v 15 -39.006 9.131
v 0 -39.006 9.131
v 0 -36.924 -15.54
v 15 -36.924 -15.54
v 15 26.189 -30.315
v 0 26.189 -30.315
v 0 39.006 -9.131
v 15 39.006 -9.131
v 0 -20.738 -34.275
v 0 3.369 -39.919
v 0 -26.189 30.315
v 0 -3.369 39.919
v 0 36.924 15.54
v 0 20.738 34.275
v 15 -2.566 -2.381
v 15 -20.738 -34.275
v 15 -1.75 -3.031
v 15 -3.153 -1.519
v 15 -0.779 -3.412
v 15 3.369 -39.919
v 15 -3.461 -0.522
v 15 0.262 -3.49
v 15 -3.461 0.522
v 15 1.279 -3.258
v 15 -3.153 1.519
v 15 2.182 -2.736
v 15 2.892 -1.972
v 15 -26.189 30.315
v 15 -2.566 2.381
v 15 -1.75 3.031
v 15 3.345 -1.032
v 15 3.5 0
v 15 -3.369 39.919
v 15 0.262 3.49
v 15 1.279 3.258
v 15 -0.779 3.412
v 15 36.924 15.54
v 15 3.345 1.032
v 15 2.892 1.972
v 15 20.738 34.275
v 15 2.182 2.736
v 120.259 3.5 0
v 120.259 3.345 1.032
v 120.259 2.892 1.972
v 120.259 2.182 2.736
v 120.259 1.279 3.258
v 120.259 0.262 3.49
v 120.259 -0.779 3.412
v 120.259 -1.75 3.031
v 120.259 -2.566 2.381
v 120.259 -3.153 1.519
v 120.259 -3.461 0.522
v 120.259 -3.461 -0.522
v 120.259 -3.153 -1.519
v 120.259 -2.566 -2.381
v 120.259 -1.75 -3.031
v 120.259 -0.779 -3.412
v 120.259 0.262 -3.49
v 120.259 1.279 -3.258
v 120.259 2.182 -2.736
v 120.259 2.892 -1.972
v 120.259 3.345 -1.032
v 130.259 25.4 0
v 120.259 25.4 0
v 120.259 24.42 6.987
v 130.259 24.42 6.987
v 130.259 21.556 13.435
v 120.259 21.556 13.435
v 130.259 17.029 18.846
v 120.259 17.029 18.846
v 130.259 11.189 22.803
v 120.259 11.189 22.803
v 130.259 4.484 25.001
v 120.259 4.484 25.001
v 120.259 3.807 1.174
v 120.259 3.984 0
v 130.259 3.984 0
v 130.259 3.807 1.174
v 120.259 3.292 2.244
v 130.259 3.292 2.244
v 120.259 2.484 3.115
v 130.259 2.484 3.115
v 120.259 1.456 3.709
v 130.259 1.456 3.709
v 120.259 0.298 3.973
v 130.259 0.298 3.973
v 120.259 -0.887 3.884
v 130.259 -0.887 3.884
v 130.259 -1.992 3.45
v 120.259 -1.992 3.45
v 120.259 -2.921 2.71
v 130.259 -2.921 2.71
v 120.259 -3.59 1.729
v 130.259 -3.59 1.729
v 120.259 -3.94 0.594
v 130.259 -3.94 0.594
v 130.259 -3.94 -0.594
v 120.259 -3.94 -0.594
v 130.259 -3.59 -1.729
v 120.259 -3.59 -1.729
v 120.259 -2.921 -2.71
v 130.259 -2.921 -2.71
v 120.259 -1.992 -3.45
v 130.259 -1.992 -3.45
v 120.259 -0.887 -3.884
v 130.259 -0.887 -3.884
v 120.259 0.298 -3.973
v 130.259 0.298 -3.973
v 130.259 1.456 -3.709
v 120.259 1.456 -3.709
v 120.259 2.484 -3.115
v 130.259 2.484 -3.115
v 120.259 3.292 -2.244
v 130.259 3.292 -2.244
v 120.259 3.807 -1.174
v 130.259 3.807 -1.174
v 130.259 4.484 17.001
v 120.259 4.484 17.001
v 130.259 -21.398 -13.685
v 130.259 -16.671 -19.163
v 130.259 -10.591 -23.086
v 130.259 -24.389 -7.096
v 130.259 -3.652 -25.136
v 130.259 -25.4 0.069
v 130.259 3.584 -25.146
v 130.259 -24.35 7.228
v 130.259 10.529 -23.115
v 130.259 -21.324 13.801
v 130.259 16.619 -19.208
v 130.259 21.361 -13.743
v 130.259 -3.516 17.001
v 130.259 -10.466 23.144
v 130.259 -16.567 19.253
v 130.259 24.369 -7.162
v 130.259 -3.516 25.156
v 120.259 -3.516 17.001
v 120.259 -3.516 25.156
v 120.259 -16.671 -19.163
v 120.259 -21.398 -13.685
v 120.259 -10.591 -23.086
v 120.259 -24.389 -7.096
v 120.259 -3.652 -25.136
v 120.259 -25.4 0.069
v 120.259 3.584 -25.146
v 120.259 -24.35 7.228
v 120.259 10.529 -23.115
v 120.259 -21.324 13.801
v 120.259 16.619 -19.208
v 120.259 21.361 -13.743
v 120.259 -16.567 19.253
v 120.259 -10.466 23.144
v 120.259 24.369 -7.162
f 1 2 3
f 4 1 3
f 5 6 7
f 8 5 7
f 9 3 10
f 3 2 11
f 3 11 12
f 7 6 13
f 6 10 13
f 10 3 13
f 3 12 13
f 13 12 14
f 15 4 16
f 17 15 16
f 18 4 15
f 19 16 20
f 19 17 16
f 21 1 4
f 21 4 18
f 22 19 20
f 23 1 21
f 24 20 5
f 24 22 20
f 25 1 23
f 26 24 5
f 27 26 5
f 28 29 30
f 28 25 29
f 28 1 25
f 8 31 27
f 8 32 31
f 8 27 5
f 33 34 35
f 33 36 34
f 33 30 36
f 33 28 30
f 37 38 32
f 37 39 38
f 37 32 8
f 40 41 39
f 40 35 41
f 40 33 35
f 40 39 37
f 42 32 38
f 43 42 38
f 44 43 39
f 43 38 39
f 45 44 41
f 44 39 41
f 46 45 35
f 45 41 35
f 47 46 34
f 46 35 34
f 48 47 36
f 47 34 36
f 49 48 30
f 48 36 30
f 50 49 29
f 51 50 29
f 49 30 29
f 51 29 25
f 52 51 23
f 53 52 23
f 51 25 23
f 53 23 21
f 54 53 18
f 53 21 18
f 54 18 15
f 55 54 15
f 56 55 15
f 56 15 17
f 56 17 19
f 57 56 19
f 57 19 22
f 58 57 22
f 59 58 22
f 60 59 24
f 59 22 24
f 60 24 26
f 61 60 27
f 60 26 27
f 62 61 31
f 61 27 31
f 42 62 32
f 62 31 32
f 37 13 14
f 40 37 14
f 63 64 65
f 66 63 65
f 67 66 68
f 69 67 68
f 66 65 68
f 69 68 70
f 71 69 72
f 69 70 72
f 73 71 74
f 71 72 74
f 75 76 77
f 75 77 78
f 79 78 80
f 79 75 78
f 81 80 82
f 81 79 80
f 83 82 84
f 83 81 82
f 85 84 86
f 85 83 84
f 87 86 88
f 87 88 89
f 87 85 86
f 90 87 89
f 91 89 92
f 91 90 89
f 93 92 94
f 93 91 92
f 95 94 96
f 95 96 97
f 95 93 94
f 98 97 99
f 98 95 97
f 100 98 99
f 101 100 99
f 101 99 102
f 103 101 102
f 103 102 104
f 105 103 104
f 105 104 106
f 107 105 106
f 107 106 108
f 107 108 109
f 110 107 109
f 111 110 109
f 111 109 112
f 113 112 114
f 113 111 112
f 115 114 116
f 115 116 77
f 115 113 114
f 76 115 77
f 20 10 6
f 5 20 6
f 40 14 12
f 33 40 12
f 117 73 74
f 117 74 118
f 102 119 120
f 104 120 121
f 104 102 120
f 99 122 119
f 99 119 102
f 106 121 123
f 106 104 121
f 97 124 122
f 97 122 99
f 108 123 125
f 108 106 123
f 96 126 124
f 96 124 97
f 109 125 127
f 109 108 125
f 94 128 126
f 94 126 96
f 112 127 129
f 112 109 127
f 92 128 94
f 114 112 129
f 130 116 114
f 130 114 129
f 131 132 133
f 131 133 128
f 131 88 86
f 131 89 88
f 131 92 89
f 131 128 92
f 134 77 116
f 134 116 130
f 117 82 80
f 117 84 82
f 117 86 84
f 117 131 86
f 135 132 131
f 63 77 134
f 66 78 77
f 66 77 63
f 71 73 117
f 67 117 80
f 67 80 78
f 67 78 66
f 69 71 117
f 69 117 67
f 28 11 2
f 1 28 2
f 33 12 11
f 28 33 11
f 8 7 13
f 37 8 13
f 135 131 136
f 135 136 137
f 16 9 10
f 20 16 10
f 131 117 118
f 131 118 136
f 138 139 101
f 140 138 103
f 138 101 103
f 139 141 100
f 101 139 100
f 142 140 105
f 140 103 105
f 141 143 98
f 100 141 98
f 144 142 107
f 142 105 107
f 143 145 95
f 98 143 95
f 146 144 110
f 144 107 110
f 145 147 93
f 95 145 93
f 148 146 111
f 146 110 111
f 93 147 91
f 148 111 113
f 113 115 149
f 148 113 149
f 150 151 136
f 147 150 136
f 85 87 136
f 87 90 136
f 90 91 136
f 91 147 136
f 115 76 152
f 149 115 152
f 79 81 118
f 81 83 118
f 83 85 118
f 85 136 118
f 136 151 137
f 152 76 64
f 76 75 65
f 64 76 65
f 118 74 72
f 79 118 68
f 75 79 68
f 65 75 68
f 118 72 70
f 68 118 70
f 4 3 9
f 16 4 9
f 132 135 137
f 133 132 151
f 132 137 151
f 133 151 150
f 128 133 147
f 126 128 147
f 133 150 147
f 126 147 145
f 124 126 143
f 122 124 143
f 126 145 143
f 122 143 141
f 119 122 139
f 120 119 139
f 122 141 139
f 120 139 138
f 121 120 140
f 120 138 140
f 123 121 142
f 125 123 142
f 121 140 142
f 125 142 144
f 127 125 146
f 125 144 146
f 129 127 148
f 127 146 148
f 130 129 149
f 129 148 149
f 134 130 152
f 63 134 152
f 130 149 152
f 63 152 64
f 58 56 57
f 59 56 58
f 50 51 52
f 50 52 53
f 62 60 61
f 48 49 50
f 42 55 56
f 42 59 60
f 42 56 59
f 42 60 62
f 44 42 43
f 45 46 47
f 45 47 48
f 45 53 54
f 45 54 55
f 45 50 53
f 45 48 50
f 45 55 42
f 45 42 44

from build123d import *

# Parameters (mm, degrees)
F1_DEPTH = 15
F2_R     = 3.5
F3_DEPTH = 105.259314
F4_R     = 3.984054
F5_DEPTH = 10


with BuildPart() as f1:
    # F0 (on Right) → F1 (new body)
    with BuildSketch(Plane.YZ):
        Polygon((26.189362, -30.314648), (39.006142, -9.131345), (36.923901, 15.539822), (20.737985, 34.275305), (-3.369136, 39.918786), (-26.189362, 30.314648), (-39.006142, 9.131345), (-36.923901, -15.539822), (-20.737985, -34.275305), (3.369136, -39.918786), align=None)
    extrude(amount=F1_DEPTH)

    # F2 (on face) → F3 (join)
    with BuildSketch(Plane.YZ.offset(15)):
        Circle(F2_R)
    extrude(amount=F3_DEPTH)


with BuildPart() as f5:
    # F4 (on face) → F5 (new body)
    with BuildSketch(Plane.YZ.offset(120.259314)):
        with BuildLine():
            ThreePointArc((-3.515521, 25.155538), (-16.671319, -19.163171), (25.4, 0))
            ThreePointArc((25.4, 0), (19.481604, 16.298071), (4.484479, 25.000989))
            Line((4.484479, 25.000989), (4.484479, 17.000989))
            Line((4.484479, 17.000989), (-3.515521, 17.000989))
            Line((-3.515521, 17.000989), (-3.515521, 25.155538))
        make_face()
        Circle(F4_R, mode=Mode.SUBTRACT)
    extrude(amount=F5_DEPTH)


solid = Compound([f1.part, f5.part])
